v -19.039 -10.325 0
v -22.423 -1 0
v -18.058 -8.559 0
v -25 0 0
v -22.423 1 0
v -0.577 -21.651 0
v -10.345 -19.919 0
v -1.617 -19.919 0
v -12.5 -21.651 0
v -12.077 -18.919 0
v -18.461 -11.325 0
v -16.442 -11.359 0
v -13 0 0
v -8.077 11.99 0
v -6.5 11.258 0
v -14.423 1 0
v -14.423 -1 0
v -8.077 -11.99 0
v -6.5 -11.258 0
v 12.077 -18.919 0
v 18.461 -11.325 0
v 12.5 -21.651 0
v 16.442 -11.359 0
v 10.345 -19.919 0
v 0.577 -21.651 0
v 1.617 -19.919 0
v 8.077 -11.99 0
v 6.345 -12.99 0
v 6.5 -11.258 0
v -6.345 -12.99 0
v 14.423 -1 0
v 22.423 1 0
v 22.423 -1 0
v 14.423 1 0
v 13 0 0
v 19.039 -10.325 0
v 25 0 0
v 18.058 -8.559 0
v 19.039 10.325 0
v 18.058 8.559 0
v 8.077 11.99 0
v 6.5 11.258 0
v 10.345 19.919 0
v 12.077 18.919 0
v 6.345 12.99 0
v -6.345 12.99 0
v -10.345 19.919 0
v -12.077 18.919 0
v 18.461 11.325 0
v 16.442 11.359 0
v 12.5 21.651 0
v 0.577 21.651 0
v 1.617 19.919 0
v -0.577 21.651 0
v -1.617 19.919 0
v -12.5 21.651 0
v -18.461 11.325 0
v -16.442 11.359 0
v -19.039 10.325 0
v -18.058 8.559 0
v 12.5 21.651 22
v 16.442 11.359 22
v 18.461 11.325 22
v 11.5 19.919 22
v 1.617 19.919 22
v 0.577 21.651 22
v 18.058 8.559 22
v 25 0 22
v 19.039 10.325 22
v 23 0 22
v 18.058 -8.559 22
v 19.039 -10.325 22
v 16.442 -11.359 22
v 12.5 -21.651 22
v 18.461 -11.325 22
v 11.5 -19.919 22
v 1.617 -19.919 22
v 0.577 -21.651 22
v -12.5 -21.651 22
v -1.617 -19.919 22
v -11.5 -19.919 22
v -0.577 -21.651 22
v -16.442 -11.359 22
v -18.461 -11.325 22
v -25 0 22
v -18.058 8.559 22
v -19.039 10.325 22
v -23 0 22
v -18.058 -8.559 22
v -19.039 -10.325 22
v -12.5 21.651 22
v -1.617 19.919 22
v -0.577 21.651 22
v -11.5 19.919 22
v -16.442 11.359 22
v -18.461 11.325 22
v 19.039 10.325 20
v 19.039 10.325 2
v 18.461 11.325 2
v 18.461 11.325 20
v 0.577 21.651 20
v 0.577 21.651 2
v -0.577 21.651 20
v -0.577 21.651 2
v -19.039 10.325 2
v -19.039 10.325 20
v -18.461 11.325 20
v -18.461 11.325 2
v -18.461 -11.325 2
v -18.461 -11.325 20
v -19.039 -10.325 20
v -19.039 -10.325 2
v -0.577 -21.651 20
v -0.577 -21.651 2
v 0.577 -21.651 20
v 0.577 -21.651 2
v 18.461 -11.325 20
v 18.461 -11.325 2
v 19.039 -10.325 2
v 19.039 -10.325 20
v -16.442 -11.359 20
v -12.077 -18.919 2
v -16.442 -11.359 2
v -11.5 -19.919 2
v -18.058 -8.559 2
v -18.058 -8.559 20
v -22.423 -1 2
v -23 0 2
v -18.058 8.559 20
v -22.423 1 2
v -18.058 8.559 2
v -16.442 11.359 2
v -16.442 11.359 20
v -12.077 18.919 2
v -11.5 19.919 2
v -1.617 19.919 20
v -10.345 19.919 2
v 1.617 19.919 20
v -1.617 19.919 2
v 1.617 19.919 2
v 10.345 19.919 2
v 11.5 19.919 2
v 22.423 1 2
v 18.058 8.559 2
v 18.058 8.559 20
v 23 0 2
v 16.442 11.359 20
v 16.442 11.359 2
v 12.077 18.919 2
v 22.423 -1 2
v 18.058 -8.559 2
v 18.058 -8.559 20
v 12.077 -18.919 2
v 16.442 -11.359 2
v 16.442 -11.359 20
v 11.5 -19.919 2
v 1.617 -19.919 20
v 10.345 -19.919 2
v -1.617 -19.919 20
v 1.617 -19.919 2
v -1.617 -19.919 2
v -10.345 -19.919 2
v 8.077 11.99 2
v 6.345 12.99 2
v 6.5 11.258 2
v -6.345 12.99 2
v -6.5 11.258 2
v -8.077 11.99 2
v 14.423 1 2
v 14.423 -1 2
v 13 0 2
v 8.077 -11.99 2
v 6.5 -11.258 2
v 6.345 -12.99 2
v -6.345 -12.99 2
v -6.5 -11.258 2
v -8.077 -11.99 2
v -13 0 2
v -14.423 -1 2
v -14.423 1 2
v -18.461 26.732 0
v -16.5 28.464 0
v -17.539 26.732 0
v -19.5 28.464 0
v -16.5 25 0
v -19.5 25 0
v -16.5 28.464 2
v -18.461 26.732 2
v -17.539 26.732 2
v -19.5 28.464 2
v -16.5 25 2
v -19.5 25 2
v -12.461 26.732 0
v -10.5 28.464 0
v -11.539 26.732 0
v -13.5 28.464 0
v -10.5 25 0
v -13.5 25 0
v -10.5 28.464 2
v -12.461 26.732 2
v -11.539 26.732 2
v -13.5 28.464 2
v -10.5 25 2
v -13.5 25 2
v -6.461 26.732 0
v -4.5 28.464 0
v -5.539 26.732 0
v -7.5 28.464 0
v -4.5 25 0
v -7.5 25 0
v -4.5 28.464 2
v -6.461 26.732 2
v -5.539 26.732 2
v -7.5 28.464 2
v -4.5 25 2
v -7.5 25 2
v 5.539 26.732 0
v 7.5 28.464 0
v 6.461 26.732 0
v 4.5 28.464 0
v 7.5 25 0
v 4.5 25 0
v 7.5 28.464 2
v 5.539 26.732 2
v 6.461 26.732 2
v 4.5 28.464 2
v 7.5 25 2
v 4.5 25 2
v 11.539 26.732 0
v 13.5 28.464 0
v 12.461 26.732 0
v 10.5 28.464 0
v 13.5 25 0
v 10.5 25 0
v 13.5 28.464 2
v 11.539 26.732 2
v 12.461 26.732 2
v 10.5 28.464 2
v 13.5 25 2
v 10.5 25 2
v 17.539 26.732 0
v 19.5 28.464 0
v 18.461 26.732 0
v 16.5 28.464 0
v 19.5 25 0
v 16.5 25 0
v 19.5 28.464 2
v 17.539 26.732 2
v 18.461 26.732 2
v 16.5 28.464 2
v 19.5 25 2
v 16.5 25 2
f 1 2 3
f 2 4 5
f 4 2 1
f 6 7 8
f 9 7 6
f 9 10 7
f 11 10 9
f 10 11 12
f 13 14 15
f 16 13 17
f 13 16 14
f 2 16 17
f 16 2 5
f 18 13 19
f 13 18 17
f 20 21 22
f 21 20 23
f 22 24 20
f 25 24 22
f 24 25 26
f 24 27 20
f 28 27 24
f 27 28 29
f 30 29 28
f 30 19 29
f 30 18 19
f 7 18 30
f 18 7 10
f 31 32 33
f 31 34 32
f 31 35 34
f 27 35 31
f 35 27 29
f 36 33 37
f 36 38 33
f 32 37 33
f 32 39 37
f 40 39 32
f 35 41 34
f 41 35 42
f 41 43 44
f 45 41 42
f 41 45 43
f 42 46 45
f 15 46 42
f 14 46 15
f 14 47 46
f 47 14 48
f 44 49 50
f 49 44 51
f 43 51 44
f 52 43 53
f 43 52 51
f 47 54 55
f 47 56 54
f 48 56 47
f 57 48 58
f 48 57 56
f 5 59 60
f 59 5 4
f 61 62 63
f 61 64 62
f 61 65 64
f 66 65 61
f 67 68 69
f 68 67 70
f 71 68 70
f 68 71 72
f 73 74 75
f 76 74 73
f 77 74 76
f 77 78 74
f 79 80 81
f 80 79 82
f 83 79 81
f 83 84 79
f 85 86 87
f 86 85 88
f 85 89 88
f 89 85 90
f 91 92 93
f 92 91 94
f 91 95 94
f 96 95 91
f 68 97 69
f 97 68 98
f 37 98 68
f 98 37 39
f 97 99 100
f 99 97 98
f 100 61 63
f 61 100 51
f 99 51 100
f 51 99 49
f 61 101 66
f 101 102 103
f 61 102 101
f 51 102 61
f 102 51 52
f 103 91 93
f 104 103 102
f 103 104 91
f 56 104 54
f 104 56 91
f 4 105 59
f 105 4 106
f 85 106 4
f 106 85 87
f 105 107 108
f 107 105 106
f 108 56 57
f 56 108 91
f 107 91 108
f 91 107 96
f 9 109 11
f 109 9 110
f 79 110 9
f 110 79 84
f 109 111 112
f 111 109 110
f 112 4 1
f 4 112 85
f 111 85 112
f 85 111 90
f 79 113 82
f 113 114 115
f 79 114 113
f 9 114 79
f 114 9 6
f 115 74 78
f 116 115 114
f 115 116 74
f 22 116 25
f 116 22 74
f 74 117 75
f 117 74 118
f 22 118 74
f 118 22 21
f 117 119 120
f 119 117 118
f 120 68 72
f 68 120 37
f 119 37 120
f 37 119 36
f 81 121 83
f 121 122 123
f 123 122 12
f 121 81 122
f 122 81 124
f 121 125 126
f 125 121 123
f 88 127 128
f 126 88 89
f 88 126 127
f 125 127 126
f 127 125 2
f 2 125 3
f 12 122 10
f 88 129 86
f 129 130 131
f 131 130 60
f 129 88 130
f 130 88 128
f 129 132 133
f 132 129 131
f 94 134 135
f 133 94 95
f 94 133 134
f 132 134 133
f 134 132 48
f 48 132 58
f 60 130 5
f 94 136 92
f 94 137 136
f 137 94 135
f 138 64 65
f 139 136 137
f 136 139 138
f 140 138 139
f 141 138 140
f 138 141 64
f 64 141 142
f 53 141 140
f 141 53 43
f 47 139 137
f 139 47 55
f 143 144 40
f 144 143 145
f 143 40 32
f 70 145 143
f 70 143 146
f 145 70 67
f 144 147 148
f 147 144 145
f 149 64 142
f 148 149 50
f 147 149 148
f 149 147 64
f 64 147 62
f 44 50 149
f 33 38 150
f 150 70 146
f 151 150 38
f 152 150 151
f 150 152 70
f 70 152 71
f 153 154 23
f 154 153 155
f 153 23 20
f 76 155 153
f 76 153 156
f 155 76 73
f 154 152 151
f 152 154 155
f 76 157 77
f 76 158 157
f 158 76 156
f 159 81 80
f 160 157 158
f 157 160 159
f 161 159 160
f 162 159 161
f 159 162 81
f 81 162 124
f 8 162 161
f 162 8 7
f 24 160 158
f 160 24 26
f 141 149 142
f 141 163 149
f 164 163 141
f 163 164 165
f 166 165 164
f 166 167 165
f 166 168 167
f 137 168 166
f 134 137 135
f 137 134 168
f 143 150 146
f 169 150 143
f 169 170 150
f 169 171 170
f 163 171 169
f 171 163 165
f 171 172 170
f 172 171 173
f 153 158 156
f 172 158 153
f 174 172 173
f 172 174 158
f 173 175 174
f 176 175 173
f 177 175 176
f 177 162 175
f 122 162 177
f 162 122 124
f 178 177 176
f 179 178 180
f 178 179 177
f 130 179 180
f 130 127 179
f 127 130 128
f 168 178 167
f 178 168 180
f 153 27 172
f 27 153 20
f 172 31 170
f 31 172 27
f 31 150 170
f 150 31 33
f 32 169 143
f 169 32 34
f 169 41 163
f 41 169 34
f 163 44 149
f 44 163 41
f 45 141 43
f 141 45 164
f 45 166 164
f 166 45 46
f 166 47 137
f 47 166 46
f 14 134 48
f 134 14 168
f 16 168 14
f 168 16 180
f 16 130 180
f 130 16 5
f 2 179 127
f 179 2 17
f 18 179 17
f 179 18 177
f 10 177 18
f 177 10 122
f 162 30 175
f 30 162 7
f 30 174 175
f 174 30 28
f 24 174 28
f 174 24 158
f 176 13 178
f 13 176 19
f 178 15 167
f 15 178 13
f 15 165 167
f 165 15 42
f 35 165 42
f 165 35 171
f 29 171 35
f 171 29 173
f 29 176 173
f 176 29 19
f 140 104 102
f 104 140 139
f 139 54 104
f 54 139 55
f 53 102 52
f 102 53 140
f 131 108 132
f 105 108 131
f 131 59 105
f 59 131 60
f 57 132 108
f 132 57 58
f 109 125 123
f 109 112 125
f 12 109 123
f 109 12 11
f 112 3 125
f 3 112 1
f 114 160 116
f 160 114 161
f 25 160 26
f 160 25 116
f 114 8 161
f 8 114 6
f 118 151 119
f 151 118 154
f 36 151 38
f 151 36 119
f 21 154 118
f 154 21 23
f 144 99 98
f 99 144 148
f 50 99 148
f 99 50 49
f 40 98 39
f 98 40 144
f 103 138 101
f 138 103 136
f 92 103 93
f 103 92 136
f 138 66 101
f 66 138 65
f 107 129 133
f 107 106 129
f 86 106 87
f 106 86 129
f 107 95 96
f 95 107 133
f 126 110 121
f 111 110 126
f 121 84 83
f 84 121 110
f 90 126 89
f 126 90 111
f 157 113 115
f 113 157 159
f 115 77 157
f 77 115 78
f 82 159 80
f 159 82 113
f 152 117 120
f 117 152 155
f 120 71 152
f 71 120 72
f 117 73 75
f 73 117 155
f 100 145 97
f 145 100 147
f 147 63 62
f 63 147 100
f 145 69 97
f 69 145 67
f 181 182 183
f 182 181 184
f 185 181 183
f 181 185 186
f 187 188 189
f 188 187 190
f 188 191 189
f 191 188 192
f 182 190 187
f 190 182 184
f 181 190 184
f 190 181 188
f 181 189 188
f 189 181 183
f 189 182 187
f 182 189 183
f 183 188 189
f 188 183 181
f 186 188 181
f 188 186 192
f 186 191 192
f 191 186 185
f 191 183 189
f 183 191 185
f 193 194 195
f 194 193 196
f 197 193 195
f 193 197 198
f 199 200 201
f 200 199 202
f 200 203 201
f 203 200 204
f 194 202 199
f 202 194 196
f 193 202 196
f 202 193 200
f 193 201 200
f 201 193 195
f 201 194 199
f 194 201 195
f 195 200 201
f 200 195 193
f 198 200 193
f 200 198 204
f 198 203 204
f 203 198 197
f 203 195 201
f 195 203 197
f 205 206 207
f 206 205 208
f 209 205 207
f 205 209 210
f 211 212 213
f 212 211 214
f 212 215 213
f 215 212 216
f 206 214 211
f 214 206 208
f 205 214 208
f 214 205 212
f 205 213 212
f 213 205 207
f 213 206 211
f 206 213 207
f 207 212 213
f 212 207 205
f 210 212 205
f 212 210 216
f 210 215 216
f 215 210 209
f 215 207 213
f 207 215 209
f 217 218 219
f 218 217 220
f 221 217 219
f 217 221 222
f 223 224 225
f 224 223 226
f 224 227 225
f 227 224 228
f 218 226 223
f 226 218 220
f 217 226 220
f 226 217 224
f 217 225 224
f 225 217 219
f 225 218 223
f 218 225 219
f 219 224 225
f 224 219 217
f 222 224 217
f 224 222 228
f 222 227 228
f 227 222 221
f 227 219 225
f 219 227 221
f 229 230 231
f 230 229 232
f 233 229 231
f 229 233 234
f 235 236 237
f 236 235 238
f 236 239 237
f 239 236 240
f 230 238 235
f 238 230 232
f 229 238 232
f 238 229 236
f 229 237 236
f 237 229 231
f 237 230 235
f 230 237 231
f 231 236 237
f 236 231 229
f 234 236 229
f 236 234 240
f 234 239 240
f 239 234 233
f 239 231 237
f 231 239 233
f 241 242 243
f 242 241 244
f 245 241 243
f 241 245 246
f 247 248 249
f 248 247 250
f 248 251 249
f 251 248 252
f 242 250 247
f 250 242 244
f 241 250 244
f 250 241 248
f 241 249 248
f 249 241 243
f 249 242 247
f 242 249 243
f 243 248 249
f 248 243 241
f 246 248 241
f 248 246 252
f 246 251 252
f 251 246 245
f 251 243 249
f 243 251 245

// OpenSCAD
/* [Cell settings:] */
// Outer radius of the cell (mm)
outer_r = 25; // [20:100]

// Height of the cell (mm)
height = 20; // [10:150]

// Walls' thickness (mm)
thickness = 2; // [2:0.1:5]

// Bottom sides' thickness (mm)
bottom_thickness = 2; // [2:0.1:5]

// Bottom height (mm)
bottom_height = 2; // [1:0.1:5]

/* [Joint settings:] */
// Width (mm)
joint_width = 3; // [1:0.1:5]

// Height (mm)
joint_height = 2; // [1:0.1:5]

// Tolerance (mm)
tolerance = 0.1; // [0:0.005:0.2]


/* [Render:] */
// Cell
render_cell = true;

// Cell joints
render_joints = true;

// Drawer
render_drawer = true;

/* [Hidden] */
sides = 6;
r_koef = 0.6;

side_angle = 360 / sides;
side_distance = cos(side_angle / 2) * outer_r;

inner_angle = 90 - side_angle;
wall_thickness = cos(inner_angle) * thickness;

module cell_joint(off = tolerance) {
    width = joint_width;
    offset = wall_thickness * 0.6;
    poly_coords = [
        [0, 0],
        [width, 0],
        [width - offset, wall_thickness],
        [offset, wall_thickness]
    ];
    translate([-width / 2, 0, 0]) {
        linear_extrude(joint_height) {
            offset(delta = off) {
                polygon(poly_coords);
                translate([0, wall_thickness * 2, 0])
                    mirror([0, 1, 0])
                        polygon(poly_coords);
            }
        }
    }
}

module cell() {
    difference() {
        union() {
            linear_extrude(height + bottom_height) {
                difference() {
                    circle(r=outer_r, $fn=sides);
                    circle(r=outer_r - thickness, $fn=sides);
                }
            }

            linear_extrude(bottom_height) {
                for (i=[0:5]) {
                    rotate([0, 0, i * side_angle]) translate([outer_r * r_koef - bottom_thickness / 3, 0 - bottom_thickness / 2, 0]) square([outer_r - outer_r * r_koef, bottom_thickness]);
                }

                difference() {
                    circle(r=outer_r * r_koef, $fn=sides);
                    circle(r=outer_r * r_koef - bottom_thickness, $fn=sides);
                }
            }
        }
        for(x=[0:1]) {
            for (i=[0:5]) {
                rotate([0, 0, i * side_angle])
                    translate([0, side_distance - wall_thickness, x * height + x * bottom_height - x * joint_height])
                        cell_joint();
            }
        }
    }
}

    if (render_cell) {
        cell();
    };

    if (render_joints) {
        general_offset = joint_width + 3;
        translate([-general_offset * 3, outer_r, 0]) cell_joint(0);
        translate([-general_offset * 2, outer_r, 0]) cell_joint(0);
        translate([-general_offset, outer_r, 0]) cell_joint(0);
        translate([general_offset, outer_r, 0]) cell_joint(0);
        translate([general_offset * 2, outer_r, 0]) cell_joint(0);
        translate([general_offset * 3, outer_r, 0]) cell_joint(0);
    }
